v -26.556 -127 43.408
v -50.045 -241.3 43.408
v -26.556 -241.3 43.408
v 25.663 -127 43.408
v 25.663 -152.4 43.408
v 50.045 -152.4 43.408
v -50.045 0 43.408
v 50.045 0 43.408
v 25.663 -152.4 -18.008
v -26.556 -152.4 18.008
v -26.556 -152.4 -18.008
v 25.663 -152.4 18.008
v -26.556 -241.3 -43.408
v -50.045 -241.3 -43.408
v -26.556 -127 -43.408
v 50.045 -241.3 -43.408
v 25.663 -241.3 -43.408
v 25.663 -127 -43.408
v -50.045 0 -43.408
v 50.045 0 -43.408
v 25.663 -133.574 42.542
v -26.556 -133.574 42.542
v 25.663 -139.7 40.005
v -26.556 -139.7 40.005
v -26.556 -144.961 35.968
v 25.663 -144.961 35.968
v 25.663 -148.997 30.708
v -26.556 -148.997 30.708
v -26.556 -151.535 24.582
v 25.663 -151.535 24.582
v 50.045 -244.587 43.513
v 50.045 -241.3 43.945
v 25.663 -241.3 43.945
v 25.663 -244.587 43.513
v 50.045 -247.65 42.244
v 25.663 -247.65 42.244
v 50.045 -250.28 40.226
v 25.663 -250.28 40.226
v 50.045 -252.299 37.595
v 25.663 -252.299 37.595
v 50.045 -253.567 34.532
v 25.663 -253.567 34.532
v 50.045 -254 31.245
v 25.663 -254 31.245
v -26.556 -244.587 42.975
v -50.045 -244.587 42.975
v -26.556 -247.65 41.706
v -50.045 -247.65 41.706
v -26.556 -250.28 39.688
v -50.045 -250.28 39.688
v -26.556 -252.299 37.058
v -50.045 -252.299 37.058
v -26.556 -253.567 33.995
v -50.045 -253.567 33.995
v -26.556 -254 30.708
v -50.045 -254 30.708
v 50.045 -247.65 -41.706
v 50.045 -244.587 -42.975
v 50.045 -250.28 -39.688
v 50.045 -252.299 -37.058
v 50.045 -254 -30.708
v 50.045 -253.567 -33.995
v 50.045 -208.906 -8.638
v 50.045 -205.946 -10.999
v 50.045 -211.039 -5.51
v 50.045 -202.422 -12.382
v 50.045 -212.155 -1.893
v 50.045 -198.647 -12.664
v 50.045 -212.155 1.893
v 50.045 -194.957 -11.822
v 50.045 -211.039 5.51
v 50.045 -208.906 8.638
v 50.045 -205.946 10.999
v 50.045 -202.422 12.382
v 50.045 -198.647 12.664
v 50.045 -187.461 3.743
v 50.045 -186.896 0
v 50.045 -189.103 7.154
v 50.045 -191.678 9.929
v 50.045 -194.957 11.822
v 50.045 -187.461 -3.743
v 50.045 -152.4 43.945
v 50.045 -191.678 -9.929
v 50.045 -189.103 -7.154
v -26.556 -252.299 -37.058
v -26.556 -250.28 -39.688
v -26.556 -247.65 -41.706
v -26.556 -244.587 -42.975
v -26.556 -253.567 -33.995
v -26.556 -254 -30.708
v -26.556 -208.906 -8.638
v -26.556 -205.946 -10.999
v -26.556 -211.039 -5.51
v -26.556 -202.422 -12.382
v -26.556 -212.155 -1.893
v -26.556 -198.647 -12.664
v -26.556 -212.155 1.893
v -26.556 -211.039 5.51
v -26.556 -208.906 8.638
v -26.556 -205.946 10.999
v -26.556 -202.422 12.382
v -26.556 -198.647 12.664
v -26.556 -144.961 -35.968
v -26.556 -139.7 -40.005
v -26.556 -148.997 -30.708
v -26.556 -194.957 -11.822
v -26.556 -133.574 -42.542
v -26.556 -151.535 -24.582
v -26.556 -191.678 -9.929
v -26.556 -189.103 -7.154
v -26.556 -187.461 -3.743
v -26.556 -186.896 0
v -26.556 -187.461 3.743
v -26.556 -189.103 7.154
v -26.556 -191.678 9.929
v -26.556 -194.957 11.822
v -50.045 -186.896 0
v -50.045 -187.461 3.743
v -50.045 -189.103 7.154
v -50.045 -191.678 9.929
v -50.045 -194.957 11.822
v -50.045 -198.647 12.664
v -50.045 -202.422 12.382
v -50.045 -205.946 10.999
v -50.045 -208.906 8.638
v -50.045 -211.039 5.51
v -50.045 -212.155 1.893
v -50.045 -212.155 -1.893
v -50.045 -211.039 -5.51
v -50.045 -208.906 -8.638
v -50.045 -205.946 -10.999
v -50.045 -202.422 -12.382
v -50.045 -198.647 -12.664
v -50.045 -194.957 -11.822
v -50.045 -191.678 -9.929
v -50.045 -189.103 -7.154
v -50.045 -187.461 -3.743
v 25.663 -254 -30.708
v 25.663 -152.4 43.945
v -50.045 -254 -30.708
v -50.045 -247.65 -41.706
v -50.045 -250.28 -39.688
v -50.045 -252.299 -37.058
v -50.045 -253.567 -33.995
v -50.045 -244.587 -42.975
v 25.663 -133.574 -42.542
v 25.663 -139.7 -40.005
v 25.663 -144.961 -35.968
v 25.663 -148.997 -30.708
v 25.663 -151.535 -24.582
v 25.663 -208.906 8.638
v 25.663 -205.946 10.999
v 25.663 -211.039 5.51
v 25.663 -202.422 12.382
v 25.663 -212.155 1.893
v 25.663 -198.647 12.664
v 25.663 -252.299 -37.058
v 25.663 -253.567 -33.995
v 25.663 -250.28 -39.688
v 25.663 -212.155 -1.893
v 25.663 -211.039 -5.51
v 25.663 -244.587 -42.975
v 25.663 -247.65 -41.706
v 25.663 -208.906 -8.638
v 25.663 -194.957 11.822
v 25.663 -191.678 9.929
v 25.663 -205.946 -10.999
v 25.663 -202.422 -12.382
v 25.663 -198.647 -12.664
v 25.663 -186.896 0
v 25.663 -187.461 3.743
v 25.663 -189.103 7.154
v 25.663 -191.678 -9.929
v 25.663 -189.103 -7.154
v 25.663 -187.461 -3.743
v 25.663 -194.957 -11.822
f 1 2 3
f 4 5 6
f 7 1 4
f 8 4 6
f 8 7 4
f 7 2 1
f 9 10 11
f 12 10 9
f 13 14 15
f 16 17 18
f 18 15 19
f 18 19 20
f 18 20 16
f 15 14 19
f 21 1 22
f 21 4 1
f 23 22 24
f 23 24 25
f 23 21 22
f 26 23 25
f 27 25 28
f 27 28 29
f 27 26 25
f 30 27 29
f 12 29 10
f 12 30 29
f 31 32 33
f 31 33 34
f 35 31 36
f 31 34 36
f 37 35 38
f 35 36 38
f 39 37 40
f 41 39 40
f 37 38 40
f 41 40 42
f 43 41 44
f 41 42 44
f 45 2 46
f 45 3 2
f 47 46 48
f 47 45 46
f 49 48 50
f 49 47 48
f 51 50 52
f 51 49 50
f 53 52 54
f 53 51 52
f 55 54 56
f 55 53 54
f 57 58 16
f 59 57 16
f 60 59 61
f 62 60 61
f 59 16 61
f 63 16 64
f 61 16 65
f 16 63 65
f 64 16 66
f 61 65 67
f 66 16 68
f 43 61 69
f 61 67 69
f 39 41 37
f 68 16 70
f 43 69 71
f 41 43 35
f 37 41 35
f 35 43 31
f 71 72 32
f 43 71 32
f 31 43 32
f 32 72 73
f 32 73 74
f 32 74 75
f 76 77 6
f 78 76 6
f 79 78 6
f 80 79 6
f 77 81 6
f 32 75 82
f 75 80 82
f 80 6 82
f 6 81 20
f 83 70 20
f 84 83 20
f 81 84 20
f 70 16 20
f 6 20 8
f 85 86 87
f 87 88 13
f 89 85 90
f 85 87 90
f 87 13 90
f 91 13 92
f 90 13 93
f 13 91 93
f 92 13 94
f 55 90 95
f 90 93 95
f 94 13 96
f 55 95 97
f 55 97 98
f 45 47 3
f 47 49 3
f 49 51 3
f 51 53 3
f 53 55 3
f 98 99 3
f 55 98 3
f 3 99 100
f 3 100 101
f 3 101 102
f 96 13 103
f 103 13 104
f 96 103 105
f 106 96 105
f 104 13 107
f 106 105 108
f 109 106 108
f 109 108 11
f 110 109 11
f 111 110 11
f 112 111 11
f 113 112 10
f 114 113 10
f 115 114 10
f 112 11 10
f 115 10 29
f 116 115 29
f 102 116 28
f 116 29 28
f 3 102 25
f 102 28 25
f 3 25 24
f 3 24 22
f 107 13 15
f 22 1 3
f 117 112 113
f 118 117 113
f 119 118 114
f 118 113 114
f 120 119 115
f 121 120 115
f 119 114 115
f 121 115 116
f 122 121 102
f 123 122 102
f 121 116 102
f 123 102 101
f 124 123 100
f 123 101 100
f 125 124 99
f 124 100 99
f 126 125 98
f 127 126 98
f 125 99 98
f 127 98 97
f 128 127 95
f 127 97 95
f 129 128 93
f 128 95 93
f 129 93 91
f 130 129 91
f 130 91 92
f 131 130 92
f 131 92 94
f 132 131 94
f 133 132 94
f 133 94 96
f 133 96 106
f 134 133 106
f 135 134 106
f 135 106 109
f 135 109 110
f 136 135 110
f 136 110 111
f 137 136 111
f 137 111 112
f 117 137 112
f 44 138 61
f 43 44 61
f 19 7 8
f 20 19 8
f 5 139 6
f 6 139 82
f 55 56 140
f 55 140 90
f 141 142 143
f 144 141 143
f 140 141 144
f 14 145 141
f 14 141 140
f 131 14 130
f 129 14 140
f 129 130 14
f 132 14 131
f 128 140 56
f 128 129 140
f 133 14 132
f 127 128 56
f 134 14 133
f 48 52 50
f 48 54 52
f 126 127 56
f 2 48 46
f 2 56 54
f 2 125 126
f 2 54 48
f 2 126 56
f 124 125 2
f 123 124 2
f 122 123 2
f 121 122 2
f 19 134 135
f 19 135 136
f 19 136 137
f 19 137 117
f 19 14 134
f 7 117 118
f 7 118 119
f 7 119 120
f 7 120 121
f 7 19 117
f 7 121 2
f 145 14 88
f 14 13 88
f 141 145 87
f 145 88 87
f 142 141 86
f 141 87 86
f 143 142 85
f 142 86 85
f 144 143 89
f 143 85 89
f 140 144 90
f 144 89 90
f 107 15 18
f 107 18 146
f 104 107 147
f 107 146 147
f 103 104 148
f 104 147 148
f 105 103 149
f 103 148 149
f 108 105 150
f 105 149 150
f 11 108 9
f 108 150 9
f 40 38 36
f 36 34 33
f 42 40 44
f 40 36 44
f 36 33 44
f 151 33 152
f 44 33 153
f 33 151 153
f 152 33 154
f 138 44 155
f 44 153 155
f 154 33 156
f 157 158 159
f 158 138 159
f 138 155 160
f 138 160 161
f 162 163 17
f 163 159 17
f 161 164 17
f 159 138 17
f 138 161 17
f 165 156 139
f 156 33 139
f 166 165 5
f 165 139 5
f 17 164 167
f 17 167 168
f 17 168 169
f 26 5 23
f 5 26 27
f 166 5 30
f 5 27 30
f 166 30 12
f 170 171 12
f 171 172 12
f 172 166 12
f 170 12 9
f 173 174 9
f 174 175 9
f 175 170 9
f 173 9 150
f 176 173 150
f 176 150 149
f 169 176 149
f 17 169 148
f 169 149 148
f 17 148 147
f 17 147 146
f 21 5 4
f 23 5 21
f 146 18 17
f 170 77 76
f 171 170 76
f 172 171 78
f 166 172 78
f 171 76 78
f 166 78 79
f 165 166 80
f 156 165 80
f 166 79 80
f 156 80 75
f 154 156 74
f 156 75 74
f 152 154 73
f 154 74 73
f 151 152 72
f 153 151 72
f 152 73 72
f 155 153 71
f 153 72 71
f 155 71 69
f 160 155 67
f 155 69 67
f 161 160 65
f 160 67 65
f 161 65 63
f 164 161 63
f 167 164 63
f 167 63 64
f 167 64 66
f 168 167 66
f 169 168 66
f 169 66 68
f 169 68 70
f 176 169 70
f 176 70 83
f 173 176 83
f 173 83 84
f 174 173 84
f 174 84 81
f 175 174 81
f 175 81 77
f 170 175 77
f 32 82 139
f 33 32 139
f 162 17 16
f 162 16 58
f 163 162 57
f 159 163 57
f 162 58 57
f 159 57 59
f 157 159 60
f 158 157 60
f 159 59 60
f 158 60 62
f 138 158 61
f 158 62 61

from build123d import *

# Parameters (mm, degrees)
F0_W     = 100.0908872011
F0_H     = 86.8150984859
F1_DEPTH = 152.4
F2_W     = 23.4895850481
F2_H     = 86.8150984859
F2_W_2   = 0.6694942713
F2_W_3   = 23.7127671899
F3_DEPTH = 101.6
F4_R     = 12.7
F6_D     = 25.4
F7_R     = 25.4


with BuildPart() as f1:
    # F0 (on Front) → F1 (new body)
    with BuildSketch(Plane.XZ):
        Rectangle(F0_W, F0_H)
    extrude(amount=F1_DEPTH)

    # F2 (on face) → F3 (join)
    with BuildSketch(Plane.XZ.offset(152.4)):
        with Locations((-38.3006510765, 0)):
            Rectangle(F2_W, F2_H)
        Polygon((25.6631821394, 43.9454764128), (25.6631821394, 43.4075492429), (26.3326764107, 43.4075492429), (50.0454436006, 43.4075492429), (50.0454436006, 43.9454764128), align=None)
        with Locations((25.997929275, 0)):
            Rectangle(F2_W_2, F2_H)
        with Locations((38.1890600056, 0)):
            Rectangle(F2_W_3, F2_H)
    extrude(amount=F3_DEPTH)

    # F4
    f4_edges = [f1.edges().sort_by_distance(p)[0] for p in [
        (-38.300651, -254, -43.407549),
        (37.854313, -254, -43.407549),
        (37.854313, -254, 43.945476),
        (-38.300651, -254, 43.407549),
    ]]
    fillet(f4_edges, radius=F4_R)

    # F6 (through all)
    with Locations(Plane(origin=(-50.0454436006, 0, 0), x_dir=(0, -1, 0), z_dir=(-1, 0, 0))):
        with Locations((199.5964795351, 0)):
            Hole(F6_D / 2)

    # F7
    f7_edges = [f1.edges().sort_by_distance(p)[0] for p in [
        (-0.446338, -152.4, -43.407549),
        (-0.446338, -152.4, 43.407549),
    ]]
    fillet(f7_edges, radius=F7_R)


solid = f1.part
